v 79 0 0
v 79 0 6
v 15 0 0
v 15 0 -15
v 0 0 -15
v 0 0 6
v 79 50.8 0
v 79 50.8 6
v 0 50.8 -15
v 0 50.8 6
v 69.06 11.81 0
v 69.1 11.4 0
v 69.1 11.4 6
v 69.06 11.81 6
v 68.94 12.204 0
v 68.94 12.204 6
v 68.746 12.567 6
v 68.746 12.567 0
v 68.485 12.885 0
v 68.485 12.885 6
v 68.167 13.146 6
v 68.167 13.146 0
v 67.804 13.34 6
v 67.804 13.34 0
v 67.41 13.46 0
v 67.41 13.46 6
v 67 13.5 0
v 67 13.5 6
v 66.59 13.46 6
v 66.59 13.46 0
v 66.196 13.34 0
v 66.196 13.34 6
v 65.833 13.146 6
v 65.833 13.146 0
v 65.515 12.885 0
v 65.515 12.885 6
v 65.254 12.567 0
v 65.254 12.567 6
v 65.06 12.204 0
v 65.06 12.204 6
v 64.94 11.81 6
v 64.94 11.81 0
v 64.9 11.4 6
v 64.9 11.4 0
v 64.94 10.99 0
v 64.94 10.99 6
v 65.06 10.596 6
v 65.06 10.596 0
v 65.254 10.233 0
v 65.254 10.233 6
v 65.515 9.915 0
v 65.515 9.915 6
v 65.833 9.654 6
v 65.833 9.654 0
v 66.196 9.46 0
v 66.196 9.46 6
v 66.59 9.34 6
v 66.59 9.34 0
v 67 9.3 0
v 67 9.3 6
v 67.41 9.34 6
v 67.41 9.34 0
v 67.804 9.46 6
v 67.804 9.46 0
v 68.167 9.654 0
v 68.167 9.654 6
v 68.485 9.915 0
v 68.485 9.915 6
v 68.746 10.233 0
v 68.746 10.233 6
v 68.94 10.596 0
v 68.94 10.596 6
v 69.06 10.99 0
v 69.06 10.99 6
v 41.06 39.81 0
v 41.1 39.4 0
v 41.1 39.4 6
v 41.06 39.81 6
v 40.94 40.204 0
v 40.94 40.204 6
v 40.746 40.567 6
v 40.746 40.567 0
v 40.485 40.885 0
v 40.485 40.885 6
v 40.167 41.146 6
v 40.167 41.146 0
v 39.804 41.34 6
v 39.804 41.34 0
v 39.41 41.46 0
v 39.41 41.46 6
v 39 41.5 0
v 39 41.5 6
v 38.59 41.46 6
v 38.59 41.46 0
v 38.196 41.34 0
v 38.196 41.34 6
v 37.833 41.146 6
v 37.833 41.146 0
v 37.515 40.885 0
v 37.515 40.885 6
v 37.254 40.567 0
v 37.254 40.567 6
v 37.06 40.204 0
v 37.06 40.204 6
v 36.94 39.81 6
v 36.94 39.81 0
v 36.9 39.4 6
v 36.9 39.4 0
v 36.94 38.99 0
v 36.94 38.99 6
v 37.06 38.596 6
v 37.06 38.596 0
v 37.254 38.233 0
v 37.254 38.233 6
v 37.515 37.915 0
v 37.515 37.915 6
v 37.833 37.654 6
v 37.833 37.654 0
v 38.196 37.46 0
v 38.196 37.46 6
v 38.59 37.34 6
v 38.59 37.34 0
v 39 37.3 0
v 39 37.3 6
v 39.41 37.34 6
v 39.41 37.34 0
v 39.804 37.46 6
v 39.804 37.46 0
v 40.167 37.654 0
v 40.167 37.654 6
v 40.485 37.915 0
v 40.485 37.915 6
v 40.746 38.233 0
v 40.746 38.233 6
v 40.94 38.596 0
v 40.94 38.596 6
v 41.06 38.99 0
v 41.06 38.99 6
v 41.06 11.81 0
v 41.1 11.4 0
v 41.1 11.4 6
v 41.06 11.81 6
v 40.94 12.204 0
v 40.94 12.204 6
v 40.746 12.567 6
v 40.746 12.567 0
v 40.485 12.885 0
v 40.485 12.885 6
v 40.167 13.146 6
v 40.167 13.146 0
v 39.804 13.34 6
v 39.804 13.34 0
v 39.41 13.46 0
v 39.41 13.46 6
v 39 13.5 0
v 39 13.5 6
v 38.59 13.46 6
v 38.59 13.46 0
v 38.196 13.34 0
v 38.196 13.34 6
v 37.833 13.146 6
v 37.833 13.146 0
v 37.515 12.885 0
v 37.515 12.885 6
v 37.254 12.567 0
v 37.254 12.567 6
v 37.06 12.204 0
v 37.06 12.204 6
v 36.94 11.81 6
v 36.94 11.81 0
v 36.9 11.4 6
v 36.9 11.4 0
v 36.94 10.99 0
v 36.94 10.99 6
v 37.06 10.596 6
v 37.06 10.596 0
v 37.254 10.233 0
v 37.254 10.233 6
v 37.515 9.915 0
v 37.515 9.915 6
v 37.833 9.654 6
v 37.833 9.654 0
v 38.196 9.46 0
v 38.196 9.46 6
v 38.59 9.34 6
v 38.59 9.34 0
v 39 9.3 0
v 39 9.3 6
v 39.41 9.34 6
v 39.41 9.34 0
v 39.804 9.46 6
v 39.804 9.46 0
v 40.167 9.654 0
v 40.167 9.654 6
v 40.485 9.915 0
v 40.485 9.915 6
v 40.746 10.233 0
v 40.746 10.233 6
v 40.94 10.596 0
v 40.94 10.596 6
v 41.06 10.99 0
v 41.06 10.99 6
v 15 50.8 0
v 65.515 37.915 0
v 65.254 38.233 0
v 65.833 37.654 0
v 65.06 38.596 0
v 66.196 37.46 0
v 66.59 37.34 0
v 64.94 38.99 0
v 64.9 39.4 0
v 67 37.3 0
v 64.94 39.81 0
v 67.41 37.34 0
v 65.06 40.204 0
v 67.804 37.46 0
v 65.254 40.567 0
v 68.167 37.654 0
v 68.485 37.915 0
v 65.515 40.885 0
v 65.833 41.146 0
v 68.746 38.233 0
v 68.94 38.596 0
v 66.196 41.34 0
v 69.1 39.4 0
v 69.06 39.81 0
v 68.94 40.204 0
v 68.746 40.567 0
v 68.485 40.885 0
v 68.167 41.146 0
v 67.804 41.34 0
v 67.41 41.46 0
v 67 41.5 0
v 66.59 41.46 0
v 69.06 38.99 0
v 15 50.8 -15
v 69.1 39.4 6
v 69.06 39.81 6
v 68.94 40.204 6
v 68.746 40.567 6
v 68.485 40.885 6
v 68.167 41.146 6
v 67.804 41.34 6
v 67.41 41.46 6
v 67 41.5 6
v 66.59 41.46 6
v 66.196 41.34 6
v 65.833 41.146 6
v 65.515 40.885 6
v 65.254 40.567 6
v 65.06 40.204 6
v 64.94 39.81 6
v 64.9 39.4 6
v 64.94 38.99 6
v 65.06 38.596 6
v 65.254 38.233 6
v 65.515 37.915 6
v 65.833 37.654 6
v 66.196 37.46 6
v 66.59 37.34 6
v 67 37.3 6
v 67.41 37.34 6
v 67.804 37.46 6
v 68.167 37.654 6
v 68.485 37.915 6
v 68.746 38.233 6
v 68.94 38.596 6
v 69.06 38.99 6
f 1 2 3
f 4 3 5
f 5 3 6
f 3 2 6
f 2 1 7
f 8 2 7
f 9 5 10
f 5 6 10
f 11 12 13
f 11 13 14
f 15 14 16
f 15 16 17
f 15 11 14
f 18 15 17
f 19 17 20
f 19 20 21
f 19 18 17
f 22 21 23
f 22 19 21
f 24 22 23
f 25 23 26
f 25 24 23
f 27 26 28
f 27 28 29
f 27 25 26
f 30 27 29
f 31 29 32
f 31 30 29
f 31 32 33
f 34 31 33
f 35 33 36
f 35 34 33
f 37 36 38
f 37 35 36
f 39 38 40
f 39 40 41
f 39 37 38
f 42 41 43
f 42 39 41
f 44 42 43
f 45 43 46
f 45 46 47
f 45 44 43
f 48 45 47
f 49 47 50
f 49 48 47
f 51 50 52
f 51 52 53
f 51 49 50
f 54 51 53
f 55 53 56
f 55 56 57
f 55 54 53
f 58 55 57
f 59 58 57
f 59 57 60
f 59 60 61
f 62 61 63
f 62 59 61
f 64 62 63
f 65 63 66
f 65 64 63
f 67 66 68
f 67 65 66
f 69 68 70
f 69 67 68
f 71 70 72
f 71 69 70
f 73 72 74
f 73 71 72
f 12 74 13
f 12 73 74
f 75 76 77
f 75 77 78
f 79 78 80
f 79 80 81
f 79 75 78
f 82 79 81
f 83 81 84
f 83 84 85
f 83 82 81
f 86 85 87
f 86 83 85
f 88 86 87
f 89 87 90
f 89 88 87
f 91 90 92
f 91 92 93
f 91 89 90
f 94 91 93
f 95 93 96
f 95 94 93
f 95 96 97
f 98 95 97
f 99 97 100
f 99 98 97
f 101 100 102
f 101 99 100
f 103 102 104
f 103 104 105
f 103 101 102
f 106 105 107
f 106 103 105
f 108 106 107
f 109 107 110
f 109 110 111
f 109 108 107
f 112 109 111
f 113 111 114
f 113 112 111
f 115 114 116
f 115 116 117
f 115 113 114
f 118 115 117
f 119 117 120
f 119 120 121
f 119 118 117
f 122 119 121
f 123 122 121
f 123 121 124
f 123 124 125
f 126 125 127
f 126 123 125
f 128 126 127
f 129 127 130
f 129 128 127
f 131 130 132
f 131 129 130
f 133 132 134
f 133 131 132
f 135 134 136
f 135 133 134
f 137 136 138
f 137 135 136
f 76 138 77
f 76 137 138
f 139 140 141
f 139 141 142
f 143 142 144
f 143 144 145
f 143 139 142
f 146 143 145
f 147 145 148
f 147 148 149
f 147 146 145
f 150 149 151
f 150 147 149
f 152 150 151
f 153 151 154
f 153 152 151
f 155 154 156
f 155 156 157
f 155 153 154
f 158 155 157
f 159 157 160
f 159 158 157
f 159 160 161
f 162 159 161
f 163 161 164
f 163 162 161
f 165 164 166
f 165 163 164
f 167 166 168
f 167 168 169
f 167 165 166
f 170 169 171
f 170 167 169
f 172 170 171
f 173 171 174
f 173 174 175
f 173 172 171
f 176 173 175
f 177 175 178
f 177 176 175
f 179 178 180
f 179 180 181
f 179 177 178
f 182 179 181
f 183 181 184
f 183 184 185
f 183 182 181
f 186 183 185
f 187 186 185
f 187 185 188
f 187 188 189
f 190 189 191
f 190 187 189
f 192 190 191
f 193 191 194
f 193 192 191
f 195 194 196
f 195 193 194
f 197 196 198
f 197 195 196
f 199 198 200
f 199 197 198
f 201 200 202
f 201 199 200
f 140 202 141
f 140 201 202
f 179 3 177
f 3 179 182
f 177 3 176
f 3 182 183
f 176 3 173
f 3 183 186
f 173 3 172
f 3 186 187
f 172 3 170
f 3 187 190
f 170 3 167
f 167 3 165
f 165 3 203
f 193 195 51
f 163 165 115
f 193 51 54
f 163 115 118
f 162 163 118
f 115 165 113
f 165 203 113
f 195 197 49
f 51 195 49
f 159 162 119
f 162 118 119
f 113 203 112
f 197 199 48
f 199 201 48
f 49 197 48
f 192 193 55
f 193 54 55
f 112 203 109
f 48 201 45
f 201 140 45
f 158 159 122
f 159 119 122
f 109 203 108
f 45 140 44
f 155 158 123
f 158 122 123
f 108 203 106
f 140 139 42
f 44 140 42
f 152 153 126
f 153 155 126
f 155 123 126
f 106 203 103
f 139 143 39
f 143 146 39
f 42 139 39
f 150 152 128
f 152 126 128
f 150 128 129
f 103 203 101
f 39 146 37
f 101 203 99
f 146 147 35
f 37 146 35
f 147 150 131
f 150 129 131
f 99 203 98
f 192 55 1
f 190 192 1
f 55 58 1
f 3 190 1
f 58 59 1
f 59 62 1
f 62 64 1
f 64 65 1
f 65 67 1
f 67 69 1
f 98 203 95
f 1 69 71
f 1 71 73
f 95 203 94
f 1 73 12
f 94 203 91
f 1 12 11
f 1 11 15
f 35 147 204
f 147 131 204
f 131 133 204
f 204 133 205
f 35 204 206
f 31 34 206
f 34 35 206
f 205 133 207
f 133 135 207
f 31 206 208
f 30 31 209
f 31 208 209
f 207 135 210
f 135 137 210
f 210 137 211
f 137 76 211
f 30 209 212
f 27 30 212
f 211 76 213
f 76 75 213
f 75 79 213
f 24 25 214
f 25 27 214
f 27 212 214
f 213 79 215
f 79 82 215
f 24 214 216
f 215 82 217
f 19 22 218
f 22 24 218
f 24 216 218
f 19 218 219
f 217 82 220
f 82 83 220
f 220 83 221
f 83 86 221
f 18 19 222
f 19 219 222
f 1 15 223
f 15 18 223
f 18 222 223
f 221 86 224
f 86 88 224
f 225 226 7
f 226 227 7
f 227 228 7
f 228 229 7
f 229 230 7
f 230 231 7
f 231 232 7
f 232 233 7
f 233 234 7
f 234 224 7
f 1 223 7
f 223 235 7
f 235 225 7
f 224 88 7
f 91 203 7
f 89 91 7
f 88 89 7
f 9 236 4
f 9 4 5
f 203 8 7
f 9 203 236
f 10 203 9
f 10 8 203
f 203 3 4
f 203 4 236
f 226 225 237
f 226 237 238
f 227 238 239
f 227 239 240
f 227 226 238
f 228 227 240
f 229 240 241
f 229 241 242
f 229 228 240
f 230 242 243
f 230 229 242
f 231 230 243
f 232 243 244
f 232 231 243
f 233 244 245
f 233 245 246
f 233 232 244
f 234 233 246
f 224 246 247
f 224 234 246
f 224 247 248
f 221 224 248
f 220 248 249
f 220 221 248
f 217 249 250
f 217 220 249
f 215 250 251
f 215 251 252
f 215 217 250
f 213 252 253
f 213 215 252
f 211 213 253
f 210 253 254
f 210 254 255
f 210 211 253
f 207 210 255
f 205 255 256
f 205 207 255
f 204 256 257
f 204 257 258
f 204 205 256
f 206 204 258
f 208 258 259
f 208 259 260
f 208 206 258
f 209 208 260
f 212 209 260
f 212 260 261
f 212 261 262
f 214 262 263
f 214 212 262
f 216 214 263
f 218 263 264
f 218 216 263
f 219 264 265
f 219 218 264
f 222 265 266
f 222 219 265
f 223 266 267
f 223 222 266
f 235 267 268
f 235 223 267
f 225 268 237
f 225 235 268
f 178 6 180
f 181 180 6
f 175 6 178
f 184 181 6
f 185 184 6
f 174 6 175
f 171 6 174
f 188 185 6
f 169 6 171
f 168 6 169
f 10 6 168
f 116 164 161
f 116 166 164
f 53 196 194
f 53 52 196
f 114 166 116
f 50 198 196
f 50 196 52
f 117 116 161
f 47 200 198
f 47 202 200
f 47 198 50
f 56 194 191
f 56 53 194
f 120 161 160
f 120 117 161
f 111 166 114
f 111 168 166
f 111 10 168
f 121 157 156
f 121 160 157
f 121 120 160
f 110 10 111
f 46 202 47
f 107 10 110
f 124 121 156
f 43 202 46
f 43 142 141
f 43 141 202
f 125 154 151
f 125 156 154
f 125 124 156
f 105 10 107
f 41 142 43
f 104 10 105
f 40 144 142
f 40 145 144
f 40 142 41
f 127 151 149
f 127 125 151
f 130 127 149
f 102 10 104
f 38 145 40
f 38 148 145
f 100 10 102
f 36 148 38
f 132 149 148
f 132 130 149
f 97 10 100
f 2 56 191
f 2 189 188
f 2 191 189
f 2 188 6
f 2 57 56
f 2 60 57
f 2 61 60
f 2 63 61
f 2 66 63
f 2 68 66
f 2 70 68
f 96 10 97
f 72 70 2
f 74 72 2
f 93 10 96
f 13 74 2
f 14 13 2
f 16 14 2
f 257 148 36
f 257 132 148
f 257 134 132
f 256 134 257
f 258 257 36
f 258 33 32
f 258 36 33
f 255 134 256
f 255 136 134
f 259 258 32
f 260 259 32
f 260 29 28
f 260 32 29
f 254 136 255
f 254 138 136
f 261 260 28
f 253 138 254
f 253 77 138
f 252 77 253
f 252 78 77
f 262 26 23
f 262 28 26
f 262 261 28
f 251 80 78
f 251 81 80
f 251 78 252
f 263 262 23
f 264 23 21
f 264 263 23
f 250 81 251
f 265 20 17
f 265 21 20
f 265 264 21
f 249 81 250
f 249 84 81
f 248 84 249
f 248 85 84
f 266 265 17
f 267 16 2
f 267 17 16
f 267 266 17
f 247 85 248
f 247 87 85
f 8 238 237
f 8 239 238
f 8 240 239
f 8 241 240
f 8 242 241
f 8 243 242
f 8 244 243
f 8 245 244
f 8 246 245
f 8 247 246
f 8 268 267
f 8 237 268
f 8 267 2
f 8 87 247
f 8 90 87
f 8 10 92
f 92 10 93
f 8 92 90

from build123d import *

# Parameters (mm, degrees)
SKETCH1_W           = 79
SKETCH1_H           = 50.8
SKETCH1_R           = 2.1
BOSS_EXTRUDE1_DEPTH = 6
SKETCH3_W           = 15
SKETCH3_H           = 50.8
BOSS_EXTRUDE2_DEPTH = 15


with BuildPart() as part:
    # Sketch1 → Boss-Extrude1 (new body)
    with BuildSketch(Plane.XY):
        with Locations((39.5, 25.4)):
            Rectangle(SKETCH1_W, SKETCH1_H)
        with Locations((67, 39.4)):
            Circle(SKETCH1_R, mode=Mode.SUBTRACT)
        with Locations((67, 11.4)):
            Circle(SKETCH1_R, mode=Mode.SUBTRACT)
        with Locations((39, 39.4)):
            Circle(SKETCH1_R, mode=Mode.SUBTRACT)
        with Locations((39, 11.4)):
            Circle(SKETCH1_R, mode=Mode.SUBTRACT)
    extrude(amount=BOSS_EXTRUDE1_DEPTH)

    # Sketch3 → Boss-Extrude2 (add)
    with BuildSketch(Plane(origin=(0, 0, 0), x_dir=(-1, 0, 0), z_dir=(0, 0, -1))):
        with Locations((-7.5, 25.4)):
            Rectangle(SKETCH3_W, SKETCH3_H)
    extrude(amount=BOSS_EXTRUDE2_DEPTH)


solid = part.part
